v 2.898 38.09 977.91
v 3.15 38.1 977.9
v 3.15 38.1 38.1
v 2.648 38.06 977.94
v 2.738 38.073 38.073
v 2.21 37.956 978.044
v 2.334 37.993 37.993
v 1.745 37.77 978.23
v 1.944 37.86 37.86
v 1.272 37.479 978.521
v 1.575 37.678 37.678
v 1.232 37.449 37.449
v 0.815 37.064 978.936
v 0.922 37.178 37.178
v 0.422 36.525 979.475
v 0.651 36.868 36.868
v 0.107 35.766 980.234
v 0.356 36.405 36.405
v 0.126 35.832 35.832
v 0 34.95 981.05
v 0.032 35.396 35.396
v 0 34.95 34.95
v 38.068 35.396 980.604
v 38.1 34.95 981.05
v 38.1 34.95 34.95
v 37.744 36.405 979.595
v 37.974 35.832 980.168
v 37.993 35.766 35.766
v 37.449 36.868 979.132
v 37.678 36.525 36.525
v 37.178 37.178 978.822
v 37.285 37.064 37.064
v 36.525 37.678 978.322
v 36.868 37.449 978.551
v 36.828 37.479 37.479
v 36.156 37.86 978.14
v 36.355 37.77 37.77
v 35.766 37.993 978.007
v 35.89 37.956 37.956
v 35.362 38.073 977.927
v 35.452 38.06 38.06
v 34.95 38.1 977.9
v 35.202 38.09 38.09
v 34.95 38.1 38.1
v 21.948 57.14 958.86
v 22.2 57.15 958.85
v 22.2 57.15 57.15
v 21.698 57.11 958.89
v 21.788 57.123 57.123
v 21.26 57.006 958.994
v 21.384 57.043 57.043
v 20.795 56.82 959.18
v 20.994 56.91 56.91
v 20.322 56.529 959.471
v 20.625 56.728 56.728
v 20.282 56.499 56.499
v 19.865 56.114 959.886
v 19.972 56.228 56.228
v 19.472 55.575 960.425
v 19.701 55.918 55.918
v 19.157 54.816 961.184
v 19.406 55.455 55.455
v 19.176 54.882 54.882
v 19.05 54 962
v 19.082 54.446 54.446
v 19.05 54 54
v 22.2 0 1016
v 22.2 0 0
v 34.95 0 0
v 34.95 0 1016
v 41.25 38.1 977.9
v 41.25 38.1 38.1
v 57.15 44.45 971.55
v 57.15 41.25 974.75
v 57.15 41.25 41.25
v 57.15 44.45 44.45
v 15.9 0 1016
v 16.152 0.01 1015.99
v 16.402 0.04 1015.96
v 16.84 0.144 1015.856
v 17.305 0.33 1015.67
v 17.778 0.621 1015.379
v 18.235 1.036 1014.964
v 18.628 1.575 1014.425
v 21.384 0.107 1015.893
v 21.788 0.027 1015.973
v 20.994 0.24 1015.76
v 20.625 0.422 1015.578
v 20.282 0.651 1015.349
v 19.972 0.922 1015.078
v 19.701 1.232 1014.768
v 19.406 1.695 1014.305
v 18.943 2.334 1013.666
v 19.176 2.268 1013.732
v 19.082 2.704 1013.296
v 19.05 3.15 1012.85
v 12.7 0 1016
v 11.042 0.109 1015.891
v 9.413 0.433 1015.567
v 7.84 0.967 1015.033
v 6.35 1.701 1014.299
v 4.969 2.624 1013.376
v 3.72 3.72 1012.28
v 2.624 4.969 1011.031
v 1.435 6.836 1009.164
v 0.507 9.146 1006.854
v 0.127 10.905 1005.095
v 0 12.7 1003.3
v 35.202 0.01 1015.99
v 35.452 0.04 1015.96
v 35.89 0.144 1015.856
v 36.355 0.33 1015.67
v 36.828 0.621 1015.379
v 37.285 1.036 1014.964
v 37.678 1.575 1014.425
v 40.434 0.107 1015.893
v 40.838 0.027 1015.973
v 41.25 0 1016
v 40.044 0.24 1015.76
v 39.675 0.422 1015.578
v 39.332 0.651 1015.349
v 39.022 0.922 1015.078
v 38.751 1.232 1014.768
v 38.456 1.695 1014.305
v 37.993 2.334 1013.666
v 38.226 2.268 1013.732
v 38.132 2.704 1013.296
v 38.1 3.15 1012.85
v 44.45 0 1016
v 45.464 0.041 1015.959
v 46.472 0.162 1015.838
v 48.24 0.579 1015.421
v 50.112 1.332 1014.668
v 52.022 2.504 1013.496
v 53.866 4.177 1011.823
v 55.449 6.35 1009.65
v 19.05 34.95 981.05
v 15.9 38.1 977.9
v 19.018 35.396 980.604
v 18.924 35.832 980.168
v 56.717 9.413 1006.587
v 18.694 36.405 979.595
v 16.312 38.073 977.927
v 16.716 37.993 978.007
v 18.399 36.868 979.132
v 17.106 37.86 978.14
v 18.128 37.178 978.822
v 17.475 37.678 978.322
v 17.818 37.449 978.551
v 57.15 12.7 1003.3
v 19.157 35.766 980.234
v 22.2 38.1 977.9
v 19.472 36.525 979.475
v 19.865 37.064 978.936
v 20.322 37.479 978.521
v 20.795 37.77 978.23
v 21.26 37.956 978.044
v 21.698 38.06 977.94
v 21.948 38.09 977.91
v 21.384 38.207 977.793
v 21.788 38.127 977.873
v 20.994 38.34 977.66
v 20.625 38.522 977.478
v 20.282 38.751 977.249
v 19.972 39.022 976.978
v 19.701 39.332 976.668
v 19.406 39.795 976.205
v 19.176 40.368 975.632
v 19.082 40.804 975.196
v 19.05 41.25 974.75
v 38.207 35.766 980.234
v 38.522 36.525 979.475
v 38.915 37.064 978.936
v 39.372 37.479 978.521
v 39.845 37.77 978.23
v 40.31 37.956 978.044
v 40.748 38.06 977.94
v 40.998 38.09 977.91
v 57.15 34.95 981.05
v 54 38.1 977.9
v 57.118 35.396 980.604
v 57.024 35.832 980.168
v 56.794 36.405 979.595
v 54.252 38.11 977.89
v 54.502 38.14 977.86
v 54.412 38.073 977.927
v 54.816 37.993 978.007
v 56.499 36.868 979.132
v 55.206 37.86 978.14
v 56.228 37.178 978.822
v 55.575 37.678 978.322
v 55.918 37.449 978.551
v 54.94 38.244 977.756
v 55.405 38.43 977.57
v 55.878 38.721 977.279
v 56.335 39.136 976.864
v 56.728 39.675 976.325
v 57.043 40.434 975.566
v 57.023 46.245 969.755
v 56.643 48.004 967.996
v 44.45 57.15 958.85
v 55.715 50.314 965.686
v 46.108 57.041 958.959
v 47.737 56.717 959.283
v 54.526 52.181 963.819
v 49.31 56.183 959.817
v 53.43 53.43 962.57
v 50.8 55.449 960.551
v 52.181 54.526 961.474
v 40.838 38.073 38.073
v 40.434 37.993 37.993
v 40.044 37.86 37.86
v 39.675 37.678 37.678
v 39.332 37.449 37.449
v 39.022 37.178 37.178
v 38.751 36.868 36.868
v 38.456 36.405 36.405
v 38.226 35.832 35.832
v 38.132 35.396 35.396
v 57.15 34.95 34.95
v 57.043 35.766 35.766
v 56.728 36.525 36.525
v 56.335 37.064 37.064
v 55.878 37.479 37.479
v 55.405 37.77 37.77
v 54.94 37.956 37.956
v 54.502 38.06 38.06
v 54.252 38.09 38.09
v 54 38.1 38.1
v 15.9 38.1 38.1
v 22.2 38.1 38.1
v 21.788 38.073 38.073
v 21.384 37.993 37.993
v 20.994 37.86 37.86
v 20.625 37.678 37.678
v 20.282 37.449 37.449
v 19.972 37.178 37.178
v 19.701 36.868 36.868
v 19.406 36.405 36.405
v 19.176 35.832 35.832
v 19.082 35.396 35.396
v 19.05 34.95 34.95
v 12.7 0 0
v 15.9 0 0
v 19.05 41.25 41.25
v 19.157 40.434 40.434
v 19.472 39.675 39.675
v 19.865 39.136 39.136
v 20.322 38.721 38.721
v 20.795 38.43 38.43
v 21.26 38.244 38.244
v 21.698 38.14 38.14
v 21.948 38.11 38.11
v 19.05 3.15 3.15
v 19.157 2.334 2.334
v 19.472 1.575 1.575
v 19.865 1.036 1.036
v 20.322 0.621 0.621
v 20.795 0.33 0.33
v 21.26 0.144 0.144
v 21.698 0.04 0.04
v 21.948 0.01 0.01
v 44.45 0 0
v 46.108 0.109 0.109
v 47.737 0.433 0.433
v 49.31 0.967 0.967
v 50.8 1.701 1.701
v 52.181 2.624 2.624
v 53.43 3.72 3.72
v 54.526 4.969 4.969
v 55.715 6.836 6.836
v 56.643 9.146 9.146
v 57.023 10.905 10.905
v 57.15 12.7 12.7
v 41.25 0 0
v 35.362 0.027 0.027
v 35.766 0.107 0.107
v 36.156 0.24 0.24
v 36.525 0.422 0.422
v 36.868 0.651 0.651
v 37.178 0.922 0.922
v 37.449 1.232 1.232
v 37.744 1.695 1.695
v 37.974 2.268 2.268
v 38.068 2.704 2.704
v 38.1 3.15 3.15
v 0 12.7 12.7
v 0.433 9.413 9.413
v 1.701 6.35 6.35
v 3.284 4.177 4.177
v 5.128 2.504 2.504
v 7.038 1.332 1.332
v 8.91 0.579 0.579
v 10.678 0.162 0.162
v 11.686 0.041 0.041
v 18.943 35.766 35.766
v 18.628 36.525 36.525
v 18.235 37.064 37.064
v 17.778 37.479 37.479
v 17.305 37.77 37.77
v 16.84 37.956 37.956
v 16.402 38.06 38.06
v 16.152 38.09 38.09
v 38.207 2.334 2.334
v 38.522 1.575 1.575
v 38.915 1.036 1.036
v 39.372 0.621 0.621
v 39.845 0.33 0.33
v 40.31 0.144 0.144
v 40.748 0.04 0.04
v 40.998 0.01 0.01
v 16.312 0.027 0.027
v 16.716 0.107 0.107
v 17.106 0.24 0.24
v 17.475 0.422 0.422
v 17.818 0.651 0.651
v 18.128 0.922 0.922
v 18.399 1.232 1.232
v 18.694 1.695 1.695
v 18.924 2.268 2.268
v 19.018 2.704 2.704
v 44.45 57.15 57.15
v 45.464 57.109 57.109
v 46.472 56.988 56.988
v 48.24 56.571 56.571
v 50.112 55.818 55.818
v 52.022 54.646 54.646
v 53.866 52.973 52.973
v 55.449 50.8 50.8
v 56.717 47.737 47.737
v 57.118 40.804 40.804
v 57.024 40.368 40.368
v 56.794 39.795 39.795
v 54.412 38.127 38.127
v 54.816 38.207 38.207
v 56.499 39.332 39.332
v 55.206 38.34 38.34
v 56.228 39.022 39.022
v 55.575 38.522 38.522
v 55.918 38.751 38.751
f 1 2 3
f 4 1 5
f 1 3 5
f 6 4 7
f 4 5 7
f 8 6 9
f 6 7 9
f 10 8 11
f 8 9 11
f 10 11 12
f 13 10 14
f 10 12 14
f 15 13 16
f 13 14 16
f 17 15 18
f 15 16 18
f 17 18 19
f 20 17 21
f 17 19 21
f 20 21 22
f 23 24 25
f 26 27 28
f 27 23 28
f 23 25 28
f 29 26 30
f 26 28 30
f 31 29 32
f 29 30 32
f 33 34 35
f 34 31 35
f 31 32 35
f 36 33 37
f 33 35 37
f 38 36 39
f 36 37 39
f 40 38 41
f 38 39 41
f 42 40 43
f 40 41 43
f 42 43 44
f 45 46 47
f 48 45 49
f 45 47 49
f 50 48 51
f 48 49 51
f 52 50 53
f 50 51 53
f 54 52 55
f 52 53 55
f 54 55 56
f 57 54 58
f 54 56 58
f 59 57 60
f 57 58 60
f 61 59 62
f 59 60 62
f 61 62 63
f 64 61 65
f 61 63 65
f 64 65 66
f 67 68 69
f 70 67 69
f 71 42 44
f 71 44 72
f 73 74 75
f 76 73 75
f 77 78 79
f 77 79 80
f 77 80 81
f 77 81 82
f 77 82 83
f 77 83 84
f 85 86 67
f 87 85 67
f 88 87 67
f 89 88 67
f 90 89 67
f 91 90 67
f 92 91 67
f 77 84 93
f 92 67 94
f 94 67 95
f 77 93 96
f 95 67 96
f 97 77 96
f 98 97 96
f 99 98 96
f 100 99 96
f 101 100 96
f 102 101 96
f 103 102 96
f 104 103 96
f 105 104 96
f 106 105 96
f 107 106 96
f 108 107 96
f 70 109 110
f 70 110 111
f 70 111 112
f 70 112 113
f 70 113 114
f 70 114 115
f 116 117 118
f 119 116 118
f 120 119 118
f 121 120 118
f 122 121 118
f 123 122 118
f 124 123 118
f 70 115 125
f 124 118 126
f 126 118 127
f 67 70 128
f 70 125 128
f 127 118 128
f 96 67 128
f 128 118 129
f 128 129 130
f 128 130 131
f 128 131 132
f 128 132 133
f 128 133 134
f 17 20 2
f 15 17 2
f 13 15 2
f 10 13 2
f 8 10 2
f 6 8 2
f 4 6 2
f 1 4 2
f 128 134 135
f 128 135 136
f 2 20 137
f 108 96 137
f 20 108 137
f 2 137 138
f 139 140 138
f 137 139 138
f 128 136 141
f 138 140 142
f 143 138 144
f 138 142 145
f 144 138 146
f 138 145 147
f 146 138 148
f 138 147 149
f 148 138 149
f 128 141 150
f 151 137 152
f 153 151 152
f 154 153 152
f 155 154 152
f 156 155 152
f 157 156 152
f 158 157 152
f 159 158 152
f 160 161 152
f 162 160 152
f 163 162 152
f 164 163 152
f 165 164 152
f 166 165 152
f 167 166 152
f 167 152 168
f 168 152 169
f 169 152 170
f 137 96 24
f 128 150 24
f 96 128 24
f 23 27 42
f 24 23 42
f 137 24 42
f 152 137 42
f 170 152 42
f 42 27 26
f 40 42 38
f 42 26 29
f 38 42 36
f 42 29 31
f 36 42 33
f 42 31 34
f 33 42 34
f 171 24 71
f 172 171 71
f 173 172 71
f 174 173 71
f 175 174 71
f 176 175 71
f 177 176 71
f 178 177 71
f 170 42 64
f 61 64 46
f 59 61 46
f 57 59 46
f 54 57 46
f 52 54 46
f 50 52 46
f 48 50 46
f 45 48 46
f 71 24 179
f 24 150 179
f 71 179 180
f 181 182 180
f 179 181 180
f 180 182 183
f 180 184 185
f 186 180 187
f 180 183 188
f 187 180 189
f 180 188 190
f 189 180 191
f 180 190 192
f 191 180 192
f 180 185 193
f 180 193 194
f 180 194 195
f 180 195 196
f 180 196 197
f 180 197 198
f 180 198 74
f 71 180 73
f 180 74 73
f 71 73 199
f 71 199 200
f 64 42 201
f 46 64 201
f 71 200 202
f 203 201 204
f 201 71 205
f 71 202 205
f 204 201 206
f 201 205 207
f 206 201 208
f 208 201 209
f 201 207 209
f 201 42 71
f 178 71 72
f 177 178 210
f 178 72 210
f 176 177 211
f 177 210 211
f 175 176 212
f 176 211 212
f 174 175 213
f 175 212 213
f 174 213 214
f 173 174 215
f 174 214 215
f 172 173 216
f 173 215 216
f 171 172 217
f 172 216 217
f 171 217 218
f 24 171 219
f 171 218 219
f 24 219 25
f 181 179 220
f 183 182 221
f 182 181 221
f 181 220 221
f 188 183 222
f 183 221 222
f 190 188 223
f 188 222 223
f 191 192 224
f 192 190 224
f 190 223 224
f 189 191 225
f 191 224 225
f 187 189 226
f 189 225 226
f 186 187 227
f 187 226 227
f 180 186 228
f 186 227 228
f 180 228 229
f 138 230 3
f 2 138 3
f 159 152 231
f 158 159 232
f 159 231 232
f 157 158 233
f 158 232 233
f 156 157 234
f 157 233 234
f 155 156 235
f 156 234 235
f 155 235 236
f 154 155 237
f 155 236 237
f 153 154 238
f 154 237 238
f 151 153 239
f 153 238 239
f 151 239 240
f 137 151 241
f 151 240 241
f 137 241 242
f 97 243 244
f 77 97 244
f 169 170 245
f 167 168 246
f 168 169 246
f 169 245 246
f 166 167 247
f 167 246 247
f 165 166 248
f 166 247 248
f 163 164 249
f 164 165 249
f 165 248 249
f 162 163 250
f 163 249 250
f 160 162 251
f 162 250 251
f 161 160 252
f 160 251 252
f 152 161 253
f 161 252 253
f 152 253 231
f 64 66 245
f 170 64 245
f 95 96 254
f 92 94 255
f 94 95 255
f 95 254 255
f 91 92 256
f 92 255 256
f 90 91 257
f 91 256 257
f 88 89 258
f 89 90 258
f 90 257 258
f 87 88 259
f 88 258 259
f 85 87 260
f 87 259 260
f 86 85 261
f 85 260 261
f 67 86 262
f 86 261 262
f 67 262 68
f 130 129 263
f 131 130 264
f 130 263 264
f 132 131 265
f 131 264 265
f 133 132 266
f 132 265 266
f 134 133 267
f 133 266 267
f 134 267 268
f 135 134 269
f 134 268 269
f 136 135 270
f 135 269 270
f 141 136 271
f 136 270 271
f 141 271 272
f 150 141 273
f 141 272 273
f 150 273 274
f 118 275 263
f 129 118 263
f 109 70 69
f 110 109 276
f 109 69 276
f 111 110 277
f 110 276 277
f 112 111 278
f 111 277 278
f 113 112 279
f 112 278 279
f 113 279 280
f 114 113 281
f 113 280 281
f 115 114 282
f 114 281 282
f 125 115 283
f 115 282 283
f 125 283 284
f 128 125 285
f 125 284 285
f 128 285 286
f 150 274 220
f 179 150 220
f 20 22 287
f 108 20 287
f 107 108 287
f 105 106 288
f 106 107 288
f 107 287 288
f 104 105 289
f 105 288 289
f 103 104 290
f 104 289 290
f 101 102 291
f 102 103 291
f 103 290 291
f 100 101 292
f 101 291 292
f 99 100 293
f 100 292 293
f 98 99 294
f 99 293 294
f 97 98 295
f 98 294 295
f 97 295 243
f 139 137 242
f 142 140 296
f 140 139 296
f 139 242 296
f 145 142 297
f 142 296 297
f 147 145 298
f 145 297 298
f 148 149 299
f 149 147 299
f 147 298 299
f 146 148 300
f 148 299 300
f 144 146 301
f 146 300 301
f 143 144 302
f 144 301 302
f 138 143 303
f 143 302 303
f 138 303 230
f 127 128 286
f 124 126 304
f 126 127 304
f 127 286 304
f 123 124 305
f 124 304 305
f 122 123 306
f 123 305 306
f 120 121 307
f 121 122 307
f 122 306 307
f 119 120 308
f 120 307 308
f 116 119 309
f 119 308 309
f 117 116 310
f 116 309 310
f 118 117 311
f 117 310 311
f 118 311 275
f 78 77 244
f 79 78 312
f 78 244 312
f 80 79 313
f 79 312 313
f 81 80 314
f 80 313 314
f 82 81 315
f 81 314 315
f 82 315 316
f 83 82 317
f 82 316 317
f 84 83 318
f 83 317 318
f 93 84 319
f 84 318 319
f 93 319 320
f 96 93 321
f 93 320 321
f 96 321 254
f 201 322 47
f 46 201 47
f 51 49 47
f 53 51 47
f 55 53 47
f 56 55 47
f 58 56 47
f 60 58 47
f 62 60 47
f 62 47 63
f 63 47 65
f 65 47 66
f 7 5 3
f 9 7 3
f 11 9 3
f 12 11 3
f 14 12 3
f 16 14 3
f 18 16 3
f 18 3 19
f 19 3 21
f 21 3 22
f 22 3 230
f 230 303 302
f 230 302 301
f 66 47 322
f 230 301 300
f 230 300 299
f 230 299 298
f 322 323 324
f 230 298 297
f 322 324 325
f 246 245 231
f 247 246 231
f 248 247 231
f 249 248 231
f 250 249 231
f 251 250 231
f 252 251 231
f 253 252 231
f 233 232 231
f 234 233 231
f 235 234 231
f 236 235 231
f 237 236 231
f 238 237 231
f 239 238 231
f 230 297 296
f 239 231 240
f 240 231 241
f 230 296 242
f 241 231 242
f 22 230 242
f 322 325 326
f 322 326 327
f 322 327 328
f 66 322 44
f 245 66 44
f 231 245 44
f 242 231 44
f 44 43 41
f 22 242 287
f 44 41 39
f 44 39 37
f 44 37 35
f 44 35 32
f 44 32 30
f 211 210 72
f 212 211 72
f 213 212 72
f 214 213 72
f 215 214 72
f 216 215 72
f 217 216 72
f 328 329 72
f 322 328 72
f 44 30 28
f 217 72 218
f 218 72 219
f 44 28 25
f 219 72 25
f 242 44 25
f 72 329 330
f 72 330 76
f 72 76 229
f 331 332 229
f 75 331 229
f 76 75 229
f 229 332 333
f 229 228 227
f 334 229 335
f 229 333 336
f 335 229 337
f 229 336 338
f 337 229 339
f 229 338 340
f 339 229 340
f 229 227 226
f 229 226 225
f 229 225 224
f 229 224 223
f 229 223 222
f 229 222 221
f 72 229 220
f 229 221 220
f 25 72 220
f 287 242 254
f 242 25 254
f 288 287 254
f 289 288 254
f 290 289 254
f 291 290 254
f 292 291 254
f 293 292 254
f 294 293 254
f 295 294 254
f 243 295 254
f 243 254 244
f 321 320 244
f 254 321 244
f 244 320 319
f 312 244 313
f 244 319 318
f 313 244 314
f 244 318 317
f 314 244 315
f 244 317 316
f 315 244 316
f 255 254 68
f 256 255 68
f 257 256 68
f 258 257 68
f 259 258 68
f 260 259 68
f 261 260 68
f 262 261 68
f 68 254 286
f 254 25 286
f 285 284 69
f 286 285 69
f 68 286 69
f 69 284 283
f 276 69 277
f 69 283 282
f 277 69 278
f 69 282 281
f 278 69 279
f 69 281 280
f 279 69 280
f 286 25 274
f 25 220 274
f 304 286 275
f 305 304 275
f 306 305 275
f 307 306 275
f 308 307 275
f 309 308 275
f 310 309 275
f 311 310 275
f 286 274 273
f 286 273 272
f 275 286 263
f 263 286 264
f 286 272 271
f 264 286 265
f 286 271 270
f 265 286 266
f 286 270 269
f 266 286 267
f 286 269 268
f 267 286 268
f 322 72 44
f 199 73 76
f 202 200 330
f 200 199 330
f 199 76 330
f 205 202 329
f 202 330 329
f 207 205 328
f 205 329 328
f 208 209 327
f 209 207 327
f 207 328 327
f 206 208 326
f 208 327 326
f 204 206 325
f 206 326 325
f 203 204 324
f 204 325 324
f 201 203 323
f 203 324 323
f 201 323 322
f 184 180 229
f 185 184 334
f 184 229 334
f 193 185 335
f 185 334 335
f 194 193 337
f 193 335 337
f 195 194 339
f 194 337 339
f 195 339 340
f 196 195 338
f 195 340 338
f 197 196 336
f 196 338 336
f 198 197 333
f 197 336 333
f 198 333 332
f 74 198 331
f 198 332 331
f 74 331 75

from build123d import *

# Parameters (mm, degrees)
F1_DEPTH = 1016
F3_DEPTH = 57.151


# Not quite as in the source:
# - ends of sketch curves that miss each other by under 0.0002 mm in the source are joined


with BuildPart() as f1:
    # F0 (on Top) → F1 (new body)
    with BuildSketch(Plane.XY):
        with BuildLine():
            ThreePointArc((0, 12.7), (3.7197438789, 3.7197438789), (12.7, 0))
            Line((12.7, 0), (15.9004, 0))
            ThreePointArc((15.9004, 0), (18.127503518, 0.922496482), (19.05, 3.1496))
            Line((19.05, 3.1496), (19.05, 34.9504))
            ThreePointArc((19.05, 34.9504), (18.127503518, 37.177503518), (15.9004, 38.1))
            Line((15.9004, 38.1), (3.1496, 38.1))
            ThreePointArc((3.1496, 38.1), (0.922496482, 37.177503518), (0, 34.9504))
            Line((0, 34.9504), (0, 12.7))
        make_face()
        with BuildLine():
            Line((19.05, 34.9504), (19.05, 3.1496))
            ThreePointArc((19.05, 3.1496), (19.972496482, 0.922496482), (22.1996, 0))
            Line((22.1996, 0), (34.9504, 0))
            ThreePointArc((34.9504, 0), (37.177503518, 0.922496482), (38.1, 3.1496))
            Line((38.1, 3.1496), (38.1, 34.9504))
            ThreePointArc((38.1, 34.9504), (37.177503518, 37.177503518), (34.9504, 38.1))
            Line((34.9504, 38.1), (22.1996, 38.1))
            ThreePointArc((22.1996, 38.1), (19.972496482, 37.177503518), (19.05, 34.9504))
        make_face()
        with BuildLine():
            Line((38.1, 34.9504), (38.1, 3.1496))
            ThreePointArc((38.1, 3.1496), (39.022496482, 0.922496482), (41.2496, 0))
            Line((41.2496, 0), (44.45, 0))
            ThreePointArc((44.45, 0), (53.4302561211, 3.7197438789), (57.15, 12.7))
            Line((57.15, 12.7), (57.15, 34.9504))
            ThreePointArc((57.15, 34.9504), (56.227503518, 37.177503518), (54.0004, 38.1))
            Line((54.0004, 38.1), (41.2496, 38.1))
            ThreePointArc((41.2496, 38.1), (39.022496482, 37.177503518), (38.1, 34.9504))
        make_face()
        with BuildLine():
            ThreePointArc((19.0499988437, 41.2496), (19.9724953256, 39.022496482), (22.1995988437, 38.1))
            Line((22.1995988437, 38.1), (34.9504, 38.1))
            Line((34.9504, 38.1), (41.2496, 38.1))
            Line((41.2496, 38.1), (54.0004, 38.1))
            ThreePointArc((54.0004, 38.1), (56.2275023617, 39.022496482), (57.1499988437, 41.2496))
            Line((57.1499988437, 41.2496), (57.1499988437, 44.45))
            ThreePointArc((57.1499988437, 44.45), (53.4302549647, 53.4302561211), (44.4499988437, 57.15))
            Line((44.4499988437, 57.15), (22.1995988437, 57.15))
            ThreePointArc((22.1995988437, 57.15), (19.9724953256, 56.227503518), (19.0499988437, 54.0004))
            Line((19.0499988437, 54.0004), (19.0499988437, 41.2496))
        make_face()
    extrude(amount=F1_DEPTH)

    # F2 (on face) → F3 (cut, through all)
    with BuildSketch(Plane.YZ.offset(57.15)):
        Polygon((57.15, 0), (57.15, 57.15), (0, 0), (12.7, 0), align=None)
        Polygon((12.7, 1016), (0, 1016), (57.15, 958.85), (57.15, 1016), align=None)
    extrude(amount=-F3_DEPTH, mode=Mode.SUBTRACT)


solid = f1.part
